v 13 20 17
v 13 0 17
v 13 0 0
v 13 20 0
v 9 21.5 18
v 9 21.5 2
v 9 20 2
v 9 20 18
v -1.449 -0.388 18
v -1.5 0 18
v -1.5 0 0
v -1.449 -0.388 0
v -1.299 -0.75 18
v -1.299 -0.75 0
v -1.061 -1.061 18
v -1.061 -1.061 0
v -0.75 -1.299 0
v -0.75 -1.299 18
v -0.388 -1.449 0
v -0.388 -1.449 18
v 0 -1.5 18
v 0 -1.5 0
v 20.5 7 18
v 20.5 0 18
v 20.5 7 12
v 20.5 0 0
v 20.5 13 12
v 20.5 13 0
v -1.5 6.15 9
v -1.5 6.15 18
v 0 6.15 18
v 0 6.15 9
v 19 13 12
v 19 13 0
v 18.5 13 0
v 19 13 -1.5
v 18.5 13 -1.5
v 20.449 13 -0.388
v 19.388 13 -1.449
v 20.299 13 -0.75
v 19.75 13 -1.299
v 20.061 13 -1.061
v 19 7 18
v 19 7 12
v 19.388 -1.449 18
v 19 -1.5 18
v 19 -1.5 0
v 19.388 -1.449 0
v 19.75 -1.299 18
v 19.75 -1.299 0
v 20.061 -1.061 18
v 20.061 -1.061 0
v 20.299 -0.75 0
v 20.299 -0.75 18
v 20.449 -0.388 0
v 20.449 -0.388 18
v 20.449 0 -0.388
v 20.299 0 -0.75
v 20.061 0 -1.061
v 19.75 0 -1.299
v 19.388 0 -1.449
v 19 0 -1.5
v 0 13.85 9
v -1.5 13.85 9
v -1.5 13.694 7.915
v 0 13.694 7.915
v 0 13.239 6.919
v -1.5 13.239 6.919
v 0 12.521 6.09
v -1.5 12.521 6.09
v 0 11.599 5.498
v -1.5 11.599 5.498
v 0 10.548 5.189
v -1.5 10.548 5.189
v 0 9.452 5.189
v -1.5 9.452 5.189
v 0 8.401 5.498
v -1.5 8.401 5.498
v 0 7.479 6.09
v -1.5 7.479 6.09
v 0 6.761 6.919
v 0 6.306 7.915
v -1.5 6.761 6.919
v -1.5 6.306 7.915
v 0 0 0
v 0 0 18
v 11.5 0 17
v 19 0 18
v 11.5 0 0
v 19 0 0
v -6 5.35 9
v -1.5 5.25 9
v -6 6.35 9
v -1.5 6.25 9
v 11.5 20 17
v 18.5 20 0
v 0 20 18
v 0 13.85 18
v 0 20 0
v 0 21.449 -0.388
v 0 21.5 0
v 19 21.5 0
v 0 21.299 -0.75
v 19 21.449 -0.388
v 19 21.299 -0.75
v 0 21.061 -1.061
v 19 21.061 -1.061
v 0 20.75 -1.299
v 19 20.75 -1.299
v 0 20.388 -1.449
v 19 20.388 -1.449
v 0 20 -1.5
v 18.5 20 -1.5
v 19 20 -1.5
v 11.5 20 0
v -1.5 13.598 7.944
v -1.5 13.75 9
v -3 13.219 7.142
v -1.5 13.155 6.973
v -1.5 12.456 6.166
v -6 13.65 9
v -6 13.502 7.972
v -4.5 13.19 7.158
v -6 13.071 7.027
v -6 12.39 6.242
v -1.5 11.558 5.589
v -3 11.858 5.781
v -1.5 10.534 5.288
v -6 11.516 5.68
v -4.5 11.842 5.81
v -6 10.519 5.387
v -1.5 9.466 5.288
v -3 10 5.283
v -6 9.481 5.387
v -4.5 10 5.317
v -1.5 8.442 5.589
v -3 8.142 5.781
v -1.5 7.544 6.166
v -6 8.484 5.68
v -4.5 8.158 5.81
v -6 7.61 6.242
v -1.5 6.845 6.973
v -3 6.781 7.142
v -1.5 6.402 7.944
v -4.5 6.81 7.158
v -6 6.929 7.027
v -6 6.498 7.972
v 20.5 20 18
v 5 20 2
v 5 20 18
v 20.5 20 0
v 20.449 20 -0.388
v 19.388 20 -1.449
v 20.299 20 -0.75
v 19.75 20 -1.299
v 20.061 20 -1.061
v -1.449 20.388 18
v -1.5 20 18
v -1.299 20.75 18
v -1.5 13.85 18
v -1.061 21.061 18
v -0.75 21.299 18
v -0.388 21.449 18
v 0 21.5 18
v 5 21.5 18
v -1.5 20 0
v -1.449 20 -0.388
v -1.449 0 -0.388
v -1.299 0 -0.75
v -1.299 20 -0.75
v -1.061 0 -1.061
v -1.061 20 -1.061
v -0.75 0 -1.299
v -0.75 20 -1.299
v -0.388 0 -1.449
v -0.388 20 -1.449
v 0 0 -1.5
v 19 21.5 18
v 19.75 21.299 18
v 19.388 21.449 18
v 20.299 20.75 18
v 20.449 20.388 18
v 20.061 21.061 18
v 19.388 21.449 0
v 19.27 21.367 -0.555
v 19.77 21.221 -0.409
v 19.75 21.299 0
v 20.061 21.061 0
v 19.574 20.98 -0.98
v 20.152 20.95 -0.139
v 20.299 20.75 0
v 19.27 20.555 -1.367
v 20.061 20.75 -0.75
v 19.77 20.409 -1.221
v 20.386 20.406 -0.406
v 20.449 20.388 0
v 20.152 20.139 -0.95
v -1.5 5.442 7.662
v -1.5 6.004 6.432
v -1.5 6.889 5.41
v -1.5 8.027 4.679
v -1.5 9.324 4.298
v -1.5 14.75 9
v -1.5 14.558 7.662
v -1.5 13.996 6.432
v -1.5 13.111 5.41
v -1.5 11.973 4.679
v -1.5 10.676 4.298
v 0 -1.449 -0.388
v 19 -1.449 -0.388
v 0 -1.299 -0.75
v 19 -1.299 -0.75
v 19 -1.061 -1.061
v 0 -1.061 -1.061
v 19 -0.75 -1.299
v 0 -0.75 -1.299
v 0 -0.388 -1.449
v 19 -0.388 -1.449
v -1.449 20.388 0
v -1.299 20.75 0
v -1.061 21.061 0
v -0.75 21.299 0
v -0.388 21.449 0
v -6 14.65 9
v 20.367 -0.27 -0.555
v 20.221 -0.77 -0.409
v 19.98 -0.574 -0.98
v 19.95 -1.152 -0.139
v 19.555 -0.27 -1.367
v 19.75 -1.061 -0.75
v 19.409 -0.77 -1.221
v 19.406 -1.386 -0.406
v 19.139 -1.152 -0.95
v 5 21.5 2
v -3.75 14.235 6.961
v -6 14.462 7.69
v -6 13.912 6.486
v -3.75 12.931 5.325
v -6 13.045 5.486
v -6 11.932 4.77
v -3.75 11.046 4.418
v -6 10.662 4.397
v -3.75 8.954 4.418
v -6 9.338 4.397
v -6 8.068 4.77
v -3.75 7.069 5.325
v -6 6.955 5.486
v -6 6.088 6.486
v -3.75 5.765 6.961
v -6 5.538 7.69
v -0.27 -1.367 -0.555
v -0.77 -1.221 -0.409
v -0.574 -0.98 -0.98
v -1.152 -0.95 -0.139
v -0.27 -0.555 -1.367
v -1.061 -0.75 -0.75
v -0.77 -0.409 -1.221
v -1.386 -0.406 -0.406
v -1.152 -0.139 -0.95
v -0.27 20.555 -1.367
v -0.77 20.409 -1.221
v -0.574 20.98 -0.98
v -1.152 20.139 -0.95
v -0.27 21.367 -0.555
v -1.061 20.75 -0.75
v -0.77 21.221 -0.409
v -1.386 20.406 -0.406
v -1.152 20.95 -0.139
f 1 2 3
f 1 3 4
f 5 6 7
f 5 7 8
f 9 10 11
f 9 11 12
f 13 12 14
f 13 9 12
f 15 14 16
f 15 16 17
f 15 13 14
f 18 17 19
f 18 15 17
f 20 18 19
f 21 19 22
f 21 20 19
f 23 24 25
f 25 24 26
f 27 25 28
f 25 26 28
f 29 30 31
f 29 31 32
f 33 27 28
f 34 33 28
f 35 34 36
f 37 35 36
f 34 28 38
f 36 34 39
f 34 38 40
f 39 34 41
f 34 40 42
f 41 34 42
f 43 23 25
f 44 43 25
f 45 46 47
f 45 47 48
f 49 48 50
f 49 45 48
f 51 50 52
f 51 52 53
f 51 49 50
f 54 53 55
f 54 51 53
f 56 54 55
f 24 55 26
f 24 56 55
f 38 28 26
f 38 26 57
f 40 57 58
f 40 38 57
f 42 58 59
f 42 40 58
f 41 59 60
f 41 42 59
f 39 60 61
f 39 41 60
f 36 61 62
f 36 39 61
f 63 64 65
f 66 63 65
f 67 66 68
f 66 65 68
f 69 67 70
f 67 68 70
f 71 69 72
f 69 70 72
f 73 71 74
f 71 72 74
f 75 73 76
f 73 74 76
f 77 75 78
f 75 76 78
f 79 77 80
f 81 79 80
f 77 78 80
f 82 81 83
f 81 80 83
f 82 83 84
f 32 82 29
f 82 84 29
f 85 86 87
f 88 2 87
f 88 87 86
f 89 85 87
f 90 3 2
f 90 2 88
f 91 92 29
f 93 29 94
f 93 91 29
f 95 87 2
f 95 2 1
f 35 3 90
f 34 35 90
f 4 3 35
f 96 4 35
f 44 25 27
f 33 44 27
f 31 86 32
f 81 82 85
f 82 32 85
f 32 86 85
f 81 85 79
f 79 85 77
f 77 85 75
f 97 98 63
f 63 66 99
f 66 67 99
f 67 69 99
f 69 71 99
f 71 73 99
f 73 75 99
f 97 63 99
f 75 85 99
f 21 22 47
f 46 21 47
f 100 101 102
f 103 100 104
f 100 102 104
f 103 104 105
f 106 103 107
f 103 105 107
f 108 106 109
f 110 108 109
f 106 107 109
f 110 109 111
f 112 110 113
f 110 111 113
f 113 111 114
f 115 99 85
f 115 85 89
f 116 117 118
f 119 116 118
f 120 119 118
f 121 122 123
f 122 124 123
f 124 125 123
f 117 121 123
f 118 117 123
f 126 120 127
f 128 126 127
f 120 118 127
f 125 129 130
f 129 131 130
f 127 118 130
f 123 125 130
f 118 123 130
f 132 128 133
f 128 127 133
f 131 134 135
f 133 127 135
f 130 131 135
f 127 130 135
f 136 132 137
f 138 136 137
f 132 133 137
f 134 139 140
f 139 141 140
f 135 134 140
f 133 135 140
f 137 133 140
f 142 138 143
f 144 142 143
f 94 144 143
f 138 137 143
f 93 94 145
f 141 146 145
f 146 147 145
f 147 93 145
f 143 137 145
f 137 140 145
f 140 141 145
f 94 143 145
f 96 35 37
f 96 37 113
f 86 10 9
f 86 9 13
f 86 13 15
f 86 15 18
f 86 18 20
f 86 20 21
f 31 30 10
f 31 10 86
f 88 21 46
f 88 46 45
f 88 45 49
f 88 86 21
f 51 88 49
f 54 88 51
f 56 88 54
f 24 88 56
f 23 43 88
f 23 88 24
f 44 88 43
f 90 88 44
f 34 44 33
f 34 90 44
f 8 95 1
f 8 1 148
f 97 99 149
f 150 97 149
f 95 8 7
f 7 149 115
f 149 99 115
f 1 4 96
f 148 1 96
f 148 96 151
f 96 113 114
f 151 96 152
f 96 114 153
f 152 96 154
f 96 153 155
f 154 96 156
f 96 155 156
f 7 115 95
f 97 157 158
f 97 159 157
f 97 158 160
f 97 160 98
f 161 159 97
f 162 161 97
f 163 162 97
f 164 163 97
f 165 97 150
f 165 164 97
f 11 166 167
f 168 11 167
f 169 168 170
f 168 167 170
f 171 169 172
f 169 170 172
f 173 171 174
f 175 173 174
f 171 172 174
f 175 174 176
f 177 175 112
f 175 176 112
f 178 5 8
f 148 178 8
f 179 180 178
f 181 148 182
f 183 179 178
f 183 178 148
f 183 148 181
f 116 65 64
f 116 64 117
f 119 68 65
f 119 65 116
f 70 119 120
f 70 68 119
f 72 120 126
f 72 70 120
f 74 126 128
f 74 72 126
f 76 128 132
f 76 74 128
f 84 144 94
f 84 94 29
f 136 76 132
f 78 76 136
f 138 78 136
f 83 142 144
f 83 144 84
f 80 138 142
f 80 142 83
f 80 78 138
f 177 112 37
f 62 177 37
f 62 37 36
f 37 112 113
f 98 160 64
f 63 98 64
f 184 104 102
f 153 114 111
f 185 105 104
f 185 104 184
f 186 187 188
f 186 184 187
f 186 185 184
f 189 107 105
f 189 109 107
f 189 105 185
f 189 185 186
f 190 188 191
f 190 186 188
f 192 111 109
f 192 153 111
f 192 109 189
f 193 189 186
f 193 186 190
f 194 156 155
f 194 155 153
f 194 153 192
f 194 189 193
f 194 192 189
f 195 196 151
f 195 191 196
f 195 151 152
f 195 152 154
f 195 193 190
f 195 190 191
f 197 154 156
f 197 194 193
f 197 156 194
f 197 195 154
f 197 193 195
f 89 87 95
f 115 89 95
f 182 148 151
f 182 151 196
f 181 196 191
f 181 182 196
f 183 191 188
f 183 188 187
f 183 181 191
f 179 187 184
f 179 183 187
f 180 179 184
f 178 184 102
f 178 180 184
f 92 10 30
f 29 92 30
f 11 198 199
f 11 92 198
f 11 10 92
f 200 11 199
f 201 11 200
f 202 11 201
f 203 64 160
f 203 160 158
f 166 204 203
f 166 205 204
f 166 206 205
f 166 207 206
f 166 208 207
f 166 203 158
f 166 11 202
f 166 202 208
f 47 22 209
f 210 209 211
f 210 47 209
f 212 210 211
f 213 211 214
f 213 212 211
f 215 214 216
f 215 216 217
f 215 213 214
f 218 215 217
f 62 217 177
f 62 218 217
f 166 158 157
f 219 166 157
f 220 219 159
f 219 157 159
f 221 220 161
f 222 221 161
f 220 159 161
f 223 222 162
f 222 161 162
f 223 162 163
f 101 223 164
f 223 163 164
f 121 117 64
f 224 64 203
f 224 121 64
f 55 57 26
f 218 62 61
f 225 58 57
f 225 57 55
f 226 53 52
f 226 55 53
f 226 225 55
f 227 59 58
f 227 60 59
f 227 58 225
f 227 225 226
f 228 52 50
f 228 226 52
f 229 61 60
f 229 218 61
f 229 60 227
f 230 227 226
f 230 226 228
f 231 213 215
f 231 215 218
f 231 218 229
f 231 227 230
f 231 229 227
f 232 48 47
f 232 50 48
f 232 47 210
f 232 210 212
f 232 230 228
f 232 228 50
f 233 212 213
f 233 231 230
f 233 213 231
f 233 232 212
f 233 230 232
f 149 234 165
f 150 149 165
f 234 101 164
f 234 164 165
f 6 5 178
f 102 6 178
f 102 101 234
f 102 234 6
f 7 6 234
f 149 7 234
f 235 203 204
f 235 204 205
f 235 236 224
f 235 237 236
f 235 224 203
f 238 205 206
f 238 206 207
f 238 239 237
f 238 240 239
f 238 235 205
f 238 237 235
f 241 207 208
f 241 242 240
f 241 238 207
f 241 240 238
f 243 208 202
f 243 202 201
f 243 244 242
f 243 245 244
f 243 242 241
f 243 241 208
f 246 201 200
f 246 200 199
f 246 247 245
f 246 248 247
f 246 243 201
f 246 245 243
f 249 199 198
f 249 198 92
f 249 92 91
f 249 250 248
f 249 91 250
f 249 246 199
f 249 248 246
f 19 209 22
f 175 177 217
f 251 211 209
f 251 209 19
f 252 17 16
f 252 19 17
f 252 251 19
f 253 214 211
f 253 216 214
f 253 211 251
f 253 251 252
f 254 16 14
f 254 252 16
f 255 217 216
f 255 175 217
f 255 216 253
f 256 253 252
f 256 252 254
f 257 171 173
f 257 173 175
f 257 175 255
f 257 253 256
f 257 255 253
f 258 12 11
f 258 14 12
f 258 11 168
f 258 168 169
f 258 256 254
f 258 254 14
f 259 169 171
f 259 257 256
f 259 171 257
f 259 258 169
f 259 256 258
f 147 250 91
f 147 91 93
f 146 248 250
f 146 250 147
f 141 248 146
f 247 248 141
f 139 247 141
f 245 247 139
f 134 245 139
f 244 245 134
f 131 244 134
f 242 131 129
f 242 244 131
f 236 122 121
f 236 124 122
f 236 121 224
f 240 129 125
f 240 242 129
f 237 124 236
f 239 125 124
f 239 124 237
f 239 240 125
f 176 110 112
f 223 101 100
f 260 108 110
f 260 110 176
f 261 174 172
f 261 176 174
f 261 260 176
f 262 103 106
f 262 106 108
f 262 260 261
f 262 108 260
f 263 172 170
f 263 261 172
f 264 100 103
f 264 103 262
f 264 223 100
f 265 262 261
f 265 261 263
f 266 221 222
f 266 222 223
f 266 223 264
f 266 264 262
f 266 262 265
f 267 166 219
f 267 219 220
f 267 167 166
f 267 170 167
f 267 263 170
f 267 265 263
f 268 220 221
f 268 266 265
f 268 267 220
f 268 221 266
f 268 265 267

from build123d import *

# Parameters (mm, degrees)
CONE_ANGLE      = 180
THICKNESS001_T  = 1
BOX_W           = 19
BOX_H           = 20
BOX_DEPTH       = 18
THICKNESS_T     = 1.5
POCKET_DEPTH    = 2
SKETCH001_W     = 4
SKETCH001_H     = 18
POCKET001_DEPTH = 2
BOX001_W        = 20
BOX001_H        = 17
BOX001_DEPTH    = 1.5
POCKET002_DEPTH = 2


with BuildPart() as thickness001:
    # Cone → Cone (revolve)
    with BuildSketch(Plane(origin=(-1.5, 10, 9), x_dir=(0, 1, 0), z_dir=(0, 0, 1))):
        Polygon((0, 0), (3.75, 0), (3.65, 4.5), (0, 4.5), align=None)
    revolve(axis=Axis((-1.5, 10, 9), (-1, 0, 0)), revolution_arc=CONE_ANGLE)

    # Thickness001
    thickness001_openings = [thickness001.faces().sort_by_distance(p)[0] for p in [
        (-3.739865, 8.149887, 9),
        (-3.739865, 11.850113, 9),
        (-6, 10, 7.450892),
        (-1.5, 10, 7.408451),
    ]]
    offset(amount=THICKNESS001_T, openings=thickness001_openings)


with BuildPart() as fusion:
    # Box → Box (join)
    with BuildSketch(Plane.XY):
        with Locations((9.5, 10)):
            Rectangle(BOX_W, BOX_H)
    extrude(amount=BOX_DEPTH)

    # Thickness
    thickness_openings = [fusion.faces().sort_by_distance(p)[0] for p in [
        (9.5, 10, 18),
    ]]
    offset(amount=THICKNESS_T, openings=thickness_openings)

    # Sketch (on Face7 of Thickness) → Pocket (cut)
    with BuildSketch(Plane(origin=(-1.5, 0, 0), x_dir=(0, -1, 0), z_dir=(-1, 0, 0))):
        with BuildLine():
            ThreePointArc((-6.15, 19), (-10, 22.85), (-13.85, 19))
            Line((-13.85, 19), (-13.85, 9))
            ThreePointArc((-13.85, 9), (-10, 5.15), (-6.15, 9))
            Line((-6.15, 19), (-6.15, 9))
        make_face()
    extrude(amount=-POCKET_DEPTH, mode=Mode.SUBTRACT)

    # Sketch001 (on Face10 of Pocket) → Pocket001 (cut)
    with BuildSketch(Plane(origin=(0, 21.5, 0), x_dir=(-1, 0, 0), z_dir=(0, 1, 0))):
        with Locations((-7, 11)):
            Rectangle(SKETCH001_W, SKETCH001_H)
    extrude(amount=-POCKET001_DEPTH, mode=Mode.SUBTRACT)

    # Box001 → Box001 (join)
    with BuildSketch(Plane.YZ.offset(11.5)):
        with Locations((10, 8.5)):
            Rectangle(BOX001_W, BOX001_H)
    extrude(amount=BOX001_DEPTH)

    # Sketch002 (on Face14 of Box001) → Pocket002 (cut)
    with BuildSketch(Plane.YZ.offset(20.5)):
        Polygon((20, 18), (7, 18), (7, 12), (13, 12), (13, -10.564874), (20, -10.564874), align=None)
    extrude(amount=-POCKET002_DEPTH, mode=Mode.SUBTRACT)

    # Fusion: union Thickness001
    add(thickness001.part)


solid = fusion.part
